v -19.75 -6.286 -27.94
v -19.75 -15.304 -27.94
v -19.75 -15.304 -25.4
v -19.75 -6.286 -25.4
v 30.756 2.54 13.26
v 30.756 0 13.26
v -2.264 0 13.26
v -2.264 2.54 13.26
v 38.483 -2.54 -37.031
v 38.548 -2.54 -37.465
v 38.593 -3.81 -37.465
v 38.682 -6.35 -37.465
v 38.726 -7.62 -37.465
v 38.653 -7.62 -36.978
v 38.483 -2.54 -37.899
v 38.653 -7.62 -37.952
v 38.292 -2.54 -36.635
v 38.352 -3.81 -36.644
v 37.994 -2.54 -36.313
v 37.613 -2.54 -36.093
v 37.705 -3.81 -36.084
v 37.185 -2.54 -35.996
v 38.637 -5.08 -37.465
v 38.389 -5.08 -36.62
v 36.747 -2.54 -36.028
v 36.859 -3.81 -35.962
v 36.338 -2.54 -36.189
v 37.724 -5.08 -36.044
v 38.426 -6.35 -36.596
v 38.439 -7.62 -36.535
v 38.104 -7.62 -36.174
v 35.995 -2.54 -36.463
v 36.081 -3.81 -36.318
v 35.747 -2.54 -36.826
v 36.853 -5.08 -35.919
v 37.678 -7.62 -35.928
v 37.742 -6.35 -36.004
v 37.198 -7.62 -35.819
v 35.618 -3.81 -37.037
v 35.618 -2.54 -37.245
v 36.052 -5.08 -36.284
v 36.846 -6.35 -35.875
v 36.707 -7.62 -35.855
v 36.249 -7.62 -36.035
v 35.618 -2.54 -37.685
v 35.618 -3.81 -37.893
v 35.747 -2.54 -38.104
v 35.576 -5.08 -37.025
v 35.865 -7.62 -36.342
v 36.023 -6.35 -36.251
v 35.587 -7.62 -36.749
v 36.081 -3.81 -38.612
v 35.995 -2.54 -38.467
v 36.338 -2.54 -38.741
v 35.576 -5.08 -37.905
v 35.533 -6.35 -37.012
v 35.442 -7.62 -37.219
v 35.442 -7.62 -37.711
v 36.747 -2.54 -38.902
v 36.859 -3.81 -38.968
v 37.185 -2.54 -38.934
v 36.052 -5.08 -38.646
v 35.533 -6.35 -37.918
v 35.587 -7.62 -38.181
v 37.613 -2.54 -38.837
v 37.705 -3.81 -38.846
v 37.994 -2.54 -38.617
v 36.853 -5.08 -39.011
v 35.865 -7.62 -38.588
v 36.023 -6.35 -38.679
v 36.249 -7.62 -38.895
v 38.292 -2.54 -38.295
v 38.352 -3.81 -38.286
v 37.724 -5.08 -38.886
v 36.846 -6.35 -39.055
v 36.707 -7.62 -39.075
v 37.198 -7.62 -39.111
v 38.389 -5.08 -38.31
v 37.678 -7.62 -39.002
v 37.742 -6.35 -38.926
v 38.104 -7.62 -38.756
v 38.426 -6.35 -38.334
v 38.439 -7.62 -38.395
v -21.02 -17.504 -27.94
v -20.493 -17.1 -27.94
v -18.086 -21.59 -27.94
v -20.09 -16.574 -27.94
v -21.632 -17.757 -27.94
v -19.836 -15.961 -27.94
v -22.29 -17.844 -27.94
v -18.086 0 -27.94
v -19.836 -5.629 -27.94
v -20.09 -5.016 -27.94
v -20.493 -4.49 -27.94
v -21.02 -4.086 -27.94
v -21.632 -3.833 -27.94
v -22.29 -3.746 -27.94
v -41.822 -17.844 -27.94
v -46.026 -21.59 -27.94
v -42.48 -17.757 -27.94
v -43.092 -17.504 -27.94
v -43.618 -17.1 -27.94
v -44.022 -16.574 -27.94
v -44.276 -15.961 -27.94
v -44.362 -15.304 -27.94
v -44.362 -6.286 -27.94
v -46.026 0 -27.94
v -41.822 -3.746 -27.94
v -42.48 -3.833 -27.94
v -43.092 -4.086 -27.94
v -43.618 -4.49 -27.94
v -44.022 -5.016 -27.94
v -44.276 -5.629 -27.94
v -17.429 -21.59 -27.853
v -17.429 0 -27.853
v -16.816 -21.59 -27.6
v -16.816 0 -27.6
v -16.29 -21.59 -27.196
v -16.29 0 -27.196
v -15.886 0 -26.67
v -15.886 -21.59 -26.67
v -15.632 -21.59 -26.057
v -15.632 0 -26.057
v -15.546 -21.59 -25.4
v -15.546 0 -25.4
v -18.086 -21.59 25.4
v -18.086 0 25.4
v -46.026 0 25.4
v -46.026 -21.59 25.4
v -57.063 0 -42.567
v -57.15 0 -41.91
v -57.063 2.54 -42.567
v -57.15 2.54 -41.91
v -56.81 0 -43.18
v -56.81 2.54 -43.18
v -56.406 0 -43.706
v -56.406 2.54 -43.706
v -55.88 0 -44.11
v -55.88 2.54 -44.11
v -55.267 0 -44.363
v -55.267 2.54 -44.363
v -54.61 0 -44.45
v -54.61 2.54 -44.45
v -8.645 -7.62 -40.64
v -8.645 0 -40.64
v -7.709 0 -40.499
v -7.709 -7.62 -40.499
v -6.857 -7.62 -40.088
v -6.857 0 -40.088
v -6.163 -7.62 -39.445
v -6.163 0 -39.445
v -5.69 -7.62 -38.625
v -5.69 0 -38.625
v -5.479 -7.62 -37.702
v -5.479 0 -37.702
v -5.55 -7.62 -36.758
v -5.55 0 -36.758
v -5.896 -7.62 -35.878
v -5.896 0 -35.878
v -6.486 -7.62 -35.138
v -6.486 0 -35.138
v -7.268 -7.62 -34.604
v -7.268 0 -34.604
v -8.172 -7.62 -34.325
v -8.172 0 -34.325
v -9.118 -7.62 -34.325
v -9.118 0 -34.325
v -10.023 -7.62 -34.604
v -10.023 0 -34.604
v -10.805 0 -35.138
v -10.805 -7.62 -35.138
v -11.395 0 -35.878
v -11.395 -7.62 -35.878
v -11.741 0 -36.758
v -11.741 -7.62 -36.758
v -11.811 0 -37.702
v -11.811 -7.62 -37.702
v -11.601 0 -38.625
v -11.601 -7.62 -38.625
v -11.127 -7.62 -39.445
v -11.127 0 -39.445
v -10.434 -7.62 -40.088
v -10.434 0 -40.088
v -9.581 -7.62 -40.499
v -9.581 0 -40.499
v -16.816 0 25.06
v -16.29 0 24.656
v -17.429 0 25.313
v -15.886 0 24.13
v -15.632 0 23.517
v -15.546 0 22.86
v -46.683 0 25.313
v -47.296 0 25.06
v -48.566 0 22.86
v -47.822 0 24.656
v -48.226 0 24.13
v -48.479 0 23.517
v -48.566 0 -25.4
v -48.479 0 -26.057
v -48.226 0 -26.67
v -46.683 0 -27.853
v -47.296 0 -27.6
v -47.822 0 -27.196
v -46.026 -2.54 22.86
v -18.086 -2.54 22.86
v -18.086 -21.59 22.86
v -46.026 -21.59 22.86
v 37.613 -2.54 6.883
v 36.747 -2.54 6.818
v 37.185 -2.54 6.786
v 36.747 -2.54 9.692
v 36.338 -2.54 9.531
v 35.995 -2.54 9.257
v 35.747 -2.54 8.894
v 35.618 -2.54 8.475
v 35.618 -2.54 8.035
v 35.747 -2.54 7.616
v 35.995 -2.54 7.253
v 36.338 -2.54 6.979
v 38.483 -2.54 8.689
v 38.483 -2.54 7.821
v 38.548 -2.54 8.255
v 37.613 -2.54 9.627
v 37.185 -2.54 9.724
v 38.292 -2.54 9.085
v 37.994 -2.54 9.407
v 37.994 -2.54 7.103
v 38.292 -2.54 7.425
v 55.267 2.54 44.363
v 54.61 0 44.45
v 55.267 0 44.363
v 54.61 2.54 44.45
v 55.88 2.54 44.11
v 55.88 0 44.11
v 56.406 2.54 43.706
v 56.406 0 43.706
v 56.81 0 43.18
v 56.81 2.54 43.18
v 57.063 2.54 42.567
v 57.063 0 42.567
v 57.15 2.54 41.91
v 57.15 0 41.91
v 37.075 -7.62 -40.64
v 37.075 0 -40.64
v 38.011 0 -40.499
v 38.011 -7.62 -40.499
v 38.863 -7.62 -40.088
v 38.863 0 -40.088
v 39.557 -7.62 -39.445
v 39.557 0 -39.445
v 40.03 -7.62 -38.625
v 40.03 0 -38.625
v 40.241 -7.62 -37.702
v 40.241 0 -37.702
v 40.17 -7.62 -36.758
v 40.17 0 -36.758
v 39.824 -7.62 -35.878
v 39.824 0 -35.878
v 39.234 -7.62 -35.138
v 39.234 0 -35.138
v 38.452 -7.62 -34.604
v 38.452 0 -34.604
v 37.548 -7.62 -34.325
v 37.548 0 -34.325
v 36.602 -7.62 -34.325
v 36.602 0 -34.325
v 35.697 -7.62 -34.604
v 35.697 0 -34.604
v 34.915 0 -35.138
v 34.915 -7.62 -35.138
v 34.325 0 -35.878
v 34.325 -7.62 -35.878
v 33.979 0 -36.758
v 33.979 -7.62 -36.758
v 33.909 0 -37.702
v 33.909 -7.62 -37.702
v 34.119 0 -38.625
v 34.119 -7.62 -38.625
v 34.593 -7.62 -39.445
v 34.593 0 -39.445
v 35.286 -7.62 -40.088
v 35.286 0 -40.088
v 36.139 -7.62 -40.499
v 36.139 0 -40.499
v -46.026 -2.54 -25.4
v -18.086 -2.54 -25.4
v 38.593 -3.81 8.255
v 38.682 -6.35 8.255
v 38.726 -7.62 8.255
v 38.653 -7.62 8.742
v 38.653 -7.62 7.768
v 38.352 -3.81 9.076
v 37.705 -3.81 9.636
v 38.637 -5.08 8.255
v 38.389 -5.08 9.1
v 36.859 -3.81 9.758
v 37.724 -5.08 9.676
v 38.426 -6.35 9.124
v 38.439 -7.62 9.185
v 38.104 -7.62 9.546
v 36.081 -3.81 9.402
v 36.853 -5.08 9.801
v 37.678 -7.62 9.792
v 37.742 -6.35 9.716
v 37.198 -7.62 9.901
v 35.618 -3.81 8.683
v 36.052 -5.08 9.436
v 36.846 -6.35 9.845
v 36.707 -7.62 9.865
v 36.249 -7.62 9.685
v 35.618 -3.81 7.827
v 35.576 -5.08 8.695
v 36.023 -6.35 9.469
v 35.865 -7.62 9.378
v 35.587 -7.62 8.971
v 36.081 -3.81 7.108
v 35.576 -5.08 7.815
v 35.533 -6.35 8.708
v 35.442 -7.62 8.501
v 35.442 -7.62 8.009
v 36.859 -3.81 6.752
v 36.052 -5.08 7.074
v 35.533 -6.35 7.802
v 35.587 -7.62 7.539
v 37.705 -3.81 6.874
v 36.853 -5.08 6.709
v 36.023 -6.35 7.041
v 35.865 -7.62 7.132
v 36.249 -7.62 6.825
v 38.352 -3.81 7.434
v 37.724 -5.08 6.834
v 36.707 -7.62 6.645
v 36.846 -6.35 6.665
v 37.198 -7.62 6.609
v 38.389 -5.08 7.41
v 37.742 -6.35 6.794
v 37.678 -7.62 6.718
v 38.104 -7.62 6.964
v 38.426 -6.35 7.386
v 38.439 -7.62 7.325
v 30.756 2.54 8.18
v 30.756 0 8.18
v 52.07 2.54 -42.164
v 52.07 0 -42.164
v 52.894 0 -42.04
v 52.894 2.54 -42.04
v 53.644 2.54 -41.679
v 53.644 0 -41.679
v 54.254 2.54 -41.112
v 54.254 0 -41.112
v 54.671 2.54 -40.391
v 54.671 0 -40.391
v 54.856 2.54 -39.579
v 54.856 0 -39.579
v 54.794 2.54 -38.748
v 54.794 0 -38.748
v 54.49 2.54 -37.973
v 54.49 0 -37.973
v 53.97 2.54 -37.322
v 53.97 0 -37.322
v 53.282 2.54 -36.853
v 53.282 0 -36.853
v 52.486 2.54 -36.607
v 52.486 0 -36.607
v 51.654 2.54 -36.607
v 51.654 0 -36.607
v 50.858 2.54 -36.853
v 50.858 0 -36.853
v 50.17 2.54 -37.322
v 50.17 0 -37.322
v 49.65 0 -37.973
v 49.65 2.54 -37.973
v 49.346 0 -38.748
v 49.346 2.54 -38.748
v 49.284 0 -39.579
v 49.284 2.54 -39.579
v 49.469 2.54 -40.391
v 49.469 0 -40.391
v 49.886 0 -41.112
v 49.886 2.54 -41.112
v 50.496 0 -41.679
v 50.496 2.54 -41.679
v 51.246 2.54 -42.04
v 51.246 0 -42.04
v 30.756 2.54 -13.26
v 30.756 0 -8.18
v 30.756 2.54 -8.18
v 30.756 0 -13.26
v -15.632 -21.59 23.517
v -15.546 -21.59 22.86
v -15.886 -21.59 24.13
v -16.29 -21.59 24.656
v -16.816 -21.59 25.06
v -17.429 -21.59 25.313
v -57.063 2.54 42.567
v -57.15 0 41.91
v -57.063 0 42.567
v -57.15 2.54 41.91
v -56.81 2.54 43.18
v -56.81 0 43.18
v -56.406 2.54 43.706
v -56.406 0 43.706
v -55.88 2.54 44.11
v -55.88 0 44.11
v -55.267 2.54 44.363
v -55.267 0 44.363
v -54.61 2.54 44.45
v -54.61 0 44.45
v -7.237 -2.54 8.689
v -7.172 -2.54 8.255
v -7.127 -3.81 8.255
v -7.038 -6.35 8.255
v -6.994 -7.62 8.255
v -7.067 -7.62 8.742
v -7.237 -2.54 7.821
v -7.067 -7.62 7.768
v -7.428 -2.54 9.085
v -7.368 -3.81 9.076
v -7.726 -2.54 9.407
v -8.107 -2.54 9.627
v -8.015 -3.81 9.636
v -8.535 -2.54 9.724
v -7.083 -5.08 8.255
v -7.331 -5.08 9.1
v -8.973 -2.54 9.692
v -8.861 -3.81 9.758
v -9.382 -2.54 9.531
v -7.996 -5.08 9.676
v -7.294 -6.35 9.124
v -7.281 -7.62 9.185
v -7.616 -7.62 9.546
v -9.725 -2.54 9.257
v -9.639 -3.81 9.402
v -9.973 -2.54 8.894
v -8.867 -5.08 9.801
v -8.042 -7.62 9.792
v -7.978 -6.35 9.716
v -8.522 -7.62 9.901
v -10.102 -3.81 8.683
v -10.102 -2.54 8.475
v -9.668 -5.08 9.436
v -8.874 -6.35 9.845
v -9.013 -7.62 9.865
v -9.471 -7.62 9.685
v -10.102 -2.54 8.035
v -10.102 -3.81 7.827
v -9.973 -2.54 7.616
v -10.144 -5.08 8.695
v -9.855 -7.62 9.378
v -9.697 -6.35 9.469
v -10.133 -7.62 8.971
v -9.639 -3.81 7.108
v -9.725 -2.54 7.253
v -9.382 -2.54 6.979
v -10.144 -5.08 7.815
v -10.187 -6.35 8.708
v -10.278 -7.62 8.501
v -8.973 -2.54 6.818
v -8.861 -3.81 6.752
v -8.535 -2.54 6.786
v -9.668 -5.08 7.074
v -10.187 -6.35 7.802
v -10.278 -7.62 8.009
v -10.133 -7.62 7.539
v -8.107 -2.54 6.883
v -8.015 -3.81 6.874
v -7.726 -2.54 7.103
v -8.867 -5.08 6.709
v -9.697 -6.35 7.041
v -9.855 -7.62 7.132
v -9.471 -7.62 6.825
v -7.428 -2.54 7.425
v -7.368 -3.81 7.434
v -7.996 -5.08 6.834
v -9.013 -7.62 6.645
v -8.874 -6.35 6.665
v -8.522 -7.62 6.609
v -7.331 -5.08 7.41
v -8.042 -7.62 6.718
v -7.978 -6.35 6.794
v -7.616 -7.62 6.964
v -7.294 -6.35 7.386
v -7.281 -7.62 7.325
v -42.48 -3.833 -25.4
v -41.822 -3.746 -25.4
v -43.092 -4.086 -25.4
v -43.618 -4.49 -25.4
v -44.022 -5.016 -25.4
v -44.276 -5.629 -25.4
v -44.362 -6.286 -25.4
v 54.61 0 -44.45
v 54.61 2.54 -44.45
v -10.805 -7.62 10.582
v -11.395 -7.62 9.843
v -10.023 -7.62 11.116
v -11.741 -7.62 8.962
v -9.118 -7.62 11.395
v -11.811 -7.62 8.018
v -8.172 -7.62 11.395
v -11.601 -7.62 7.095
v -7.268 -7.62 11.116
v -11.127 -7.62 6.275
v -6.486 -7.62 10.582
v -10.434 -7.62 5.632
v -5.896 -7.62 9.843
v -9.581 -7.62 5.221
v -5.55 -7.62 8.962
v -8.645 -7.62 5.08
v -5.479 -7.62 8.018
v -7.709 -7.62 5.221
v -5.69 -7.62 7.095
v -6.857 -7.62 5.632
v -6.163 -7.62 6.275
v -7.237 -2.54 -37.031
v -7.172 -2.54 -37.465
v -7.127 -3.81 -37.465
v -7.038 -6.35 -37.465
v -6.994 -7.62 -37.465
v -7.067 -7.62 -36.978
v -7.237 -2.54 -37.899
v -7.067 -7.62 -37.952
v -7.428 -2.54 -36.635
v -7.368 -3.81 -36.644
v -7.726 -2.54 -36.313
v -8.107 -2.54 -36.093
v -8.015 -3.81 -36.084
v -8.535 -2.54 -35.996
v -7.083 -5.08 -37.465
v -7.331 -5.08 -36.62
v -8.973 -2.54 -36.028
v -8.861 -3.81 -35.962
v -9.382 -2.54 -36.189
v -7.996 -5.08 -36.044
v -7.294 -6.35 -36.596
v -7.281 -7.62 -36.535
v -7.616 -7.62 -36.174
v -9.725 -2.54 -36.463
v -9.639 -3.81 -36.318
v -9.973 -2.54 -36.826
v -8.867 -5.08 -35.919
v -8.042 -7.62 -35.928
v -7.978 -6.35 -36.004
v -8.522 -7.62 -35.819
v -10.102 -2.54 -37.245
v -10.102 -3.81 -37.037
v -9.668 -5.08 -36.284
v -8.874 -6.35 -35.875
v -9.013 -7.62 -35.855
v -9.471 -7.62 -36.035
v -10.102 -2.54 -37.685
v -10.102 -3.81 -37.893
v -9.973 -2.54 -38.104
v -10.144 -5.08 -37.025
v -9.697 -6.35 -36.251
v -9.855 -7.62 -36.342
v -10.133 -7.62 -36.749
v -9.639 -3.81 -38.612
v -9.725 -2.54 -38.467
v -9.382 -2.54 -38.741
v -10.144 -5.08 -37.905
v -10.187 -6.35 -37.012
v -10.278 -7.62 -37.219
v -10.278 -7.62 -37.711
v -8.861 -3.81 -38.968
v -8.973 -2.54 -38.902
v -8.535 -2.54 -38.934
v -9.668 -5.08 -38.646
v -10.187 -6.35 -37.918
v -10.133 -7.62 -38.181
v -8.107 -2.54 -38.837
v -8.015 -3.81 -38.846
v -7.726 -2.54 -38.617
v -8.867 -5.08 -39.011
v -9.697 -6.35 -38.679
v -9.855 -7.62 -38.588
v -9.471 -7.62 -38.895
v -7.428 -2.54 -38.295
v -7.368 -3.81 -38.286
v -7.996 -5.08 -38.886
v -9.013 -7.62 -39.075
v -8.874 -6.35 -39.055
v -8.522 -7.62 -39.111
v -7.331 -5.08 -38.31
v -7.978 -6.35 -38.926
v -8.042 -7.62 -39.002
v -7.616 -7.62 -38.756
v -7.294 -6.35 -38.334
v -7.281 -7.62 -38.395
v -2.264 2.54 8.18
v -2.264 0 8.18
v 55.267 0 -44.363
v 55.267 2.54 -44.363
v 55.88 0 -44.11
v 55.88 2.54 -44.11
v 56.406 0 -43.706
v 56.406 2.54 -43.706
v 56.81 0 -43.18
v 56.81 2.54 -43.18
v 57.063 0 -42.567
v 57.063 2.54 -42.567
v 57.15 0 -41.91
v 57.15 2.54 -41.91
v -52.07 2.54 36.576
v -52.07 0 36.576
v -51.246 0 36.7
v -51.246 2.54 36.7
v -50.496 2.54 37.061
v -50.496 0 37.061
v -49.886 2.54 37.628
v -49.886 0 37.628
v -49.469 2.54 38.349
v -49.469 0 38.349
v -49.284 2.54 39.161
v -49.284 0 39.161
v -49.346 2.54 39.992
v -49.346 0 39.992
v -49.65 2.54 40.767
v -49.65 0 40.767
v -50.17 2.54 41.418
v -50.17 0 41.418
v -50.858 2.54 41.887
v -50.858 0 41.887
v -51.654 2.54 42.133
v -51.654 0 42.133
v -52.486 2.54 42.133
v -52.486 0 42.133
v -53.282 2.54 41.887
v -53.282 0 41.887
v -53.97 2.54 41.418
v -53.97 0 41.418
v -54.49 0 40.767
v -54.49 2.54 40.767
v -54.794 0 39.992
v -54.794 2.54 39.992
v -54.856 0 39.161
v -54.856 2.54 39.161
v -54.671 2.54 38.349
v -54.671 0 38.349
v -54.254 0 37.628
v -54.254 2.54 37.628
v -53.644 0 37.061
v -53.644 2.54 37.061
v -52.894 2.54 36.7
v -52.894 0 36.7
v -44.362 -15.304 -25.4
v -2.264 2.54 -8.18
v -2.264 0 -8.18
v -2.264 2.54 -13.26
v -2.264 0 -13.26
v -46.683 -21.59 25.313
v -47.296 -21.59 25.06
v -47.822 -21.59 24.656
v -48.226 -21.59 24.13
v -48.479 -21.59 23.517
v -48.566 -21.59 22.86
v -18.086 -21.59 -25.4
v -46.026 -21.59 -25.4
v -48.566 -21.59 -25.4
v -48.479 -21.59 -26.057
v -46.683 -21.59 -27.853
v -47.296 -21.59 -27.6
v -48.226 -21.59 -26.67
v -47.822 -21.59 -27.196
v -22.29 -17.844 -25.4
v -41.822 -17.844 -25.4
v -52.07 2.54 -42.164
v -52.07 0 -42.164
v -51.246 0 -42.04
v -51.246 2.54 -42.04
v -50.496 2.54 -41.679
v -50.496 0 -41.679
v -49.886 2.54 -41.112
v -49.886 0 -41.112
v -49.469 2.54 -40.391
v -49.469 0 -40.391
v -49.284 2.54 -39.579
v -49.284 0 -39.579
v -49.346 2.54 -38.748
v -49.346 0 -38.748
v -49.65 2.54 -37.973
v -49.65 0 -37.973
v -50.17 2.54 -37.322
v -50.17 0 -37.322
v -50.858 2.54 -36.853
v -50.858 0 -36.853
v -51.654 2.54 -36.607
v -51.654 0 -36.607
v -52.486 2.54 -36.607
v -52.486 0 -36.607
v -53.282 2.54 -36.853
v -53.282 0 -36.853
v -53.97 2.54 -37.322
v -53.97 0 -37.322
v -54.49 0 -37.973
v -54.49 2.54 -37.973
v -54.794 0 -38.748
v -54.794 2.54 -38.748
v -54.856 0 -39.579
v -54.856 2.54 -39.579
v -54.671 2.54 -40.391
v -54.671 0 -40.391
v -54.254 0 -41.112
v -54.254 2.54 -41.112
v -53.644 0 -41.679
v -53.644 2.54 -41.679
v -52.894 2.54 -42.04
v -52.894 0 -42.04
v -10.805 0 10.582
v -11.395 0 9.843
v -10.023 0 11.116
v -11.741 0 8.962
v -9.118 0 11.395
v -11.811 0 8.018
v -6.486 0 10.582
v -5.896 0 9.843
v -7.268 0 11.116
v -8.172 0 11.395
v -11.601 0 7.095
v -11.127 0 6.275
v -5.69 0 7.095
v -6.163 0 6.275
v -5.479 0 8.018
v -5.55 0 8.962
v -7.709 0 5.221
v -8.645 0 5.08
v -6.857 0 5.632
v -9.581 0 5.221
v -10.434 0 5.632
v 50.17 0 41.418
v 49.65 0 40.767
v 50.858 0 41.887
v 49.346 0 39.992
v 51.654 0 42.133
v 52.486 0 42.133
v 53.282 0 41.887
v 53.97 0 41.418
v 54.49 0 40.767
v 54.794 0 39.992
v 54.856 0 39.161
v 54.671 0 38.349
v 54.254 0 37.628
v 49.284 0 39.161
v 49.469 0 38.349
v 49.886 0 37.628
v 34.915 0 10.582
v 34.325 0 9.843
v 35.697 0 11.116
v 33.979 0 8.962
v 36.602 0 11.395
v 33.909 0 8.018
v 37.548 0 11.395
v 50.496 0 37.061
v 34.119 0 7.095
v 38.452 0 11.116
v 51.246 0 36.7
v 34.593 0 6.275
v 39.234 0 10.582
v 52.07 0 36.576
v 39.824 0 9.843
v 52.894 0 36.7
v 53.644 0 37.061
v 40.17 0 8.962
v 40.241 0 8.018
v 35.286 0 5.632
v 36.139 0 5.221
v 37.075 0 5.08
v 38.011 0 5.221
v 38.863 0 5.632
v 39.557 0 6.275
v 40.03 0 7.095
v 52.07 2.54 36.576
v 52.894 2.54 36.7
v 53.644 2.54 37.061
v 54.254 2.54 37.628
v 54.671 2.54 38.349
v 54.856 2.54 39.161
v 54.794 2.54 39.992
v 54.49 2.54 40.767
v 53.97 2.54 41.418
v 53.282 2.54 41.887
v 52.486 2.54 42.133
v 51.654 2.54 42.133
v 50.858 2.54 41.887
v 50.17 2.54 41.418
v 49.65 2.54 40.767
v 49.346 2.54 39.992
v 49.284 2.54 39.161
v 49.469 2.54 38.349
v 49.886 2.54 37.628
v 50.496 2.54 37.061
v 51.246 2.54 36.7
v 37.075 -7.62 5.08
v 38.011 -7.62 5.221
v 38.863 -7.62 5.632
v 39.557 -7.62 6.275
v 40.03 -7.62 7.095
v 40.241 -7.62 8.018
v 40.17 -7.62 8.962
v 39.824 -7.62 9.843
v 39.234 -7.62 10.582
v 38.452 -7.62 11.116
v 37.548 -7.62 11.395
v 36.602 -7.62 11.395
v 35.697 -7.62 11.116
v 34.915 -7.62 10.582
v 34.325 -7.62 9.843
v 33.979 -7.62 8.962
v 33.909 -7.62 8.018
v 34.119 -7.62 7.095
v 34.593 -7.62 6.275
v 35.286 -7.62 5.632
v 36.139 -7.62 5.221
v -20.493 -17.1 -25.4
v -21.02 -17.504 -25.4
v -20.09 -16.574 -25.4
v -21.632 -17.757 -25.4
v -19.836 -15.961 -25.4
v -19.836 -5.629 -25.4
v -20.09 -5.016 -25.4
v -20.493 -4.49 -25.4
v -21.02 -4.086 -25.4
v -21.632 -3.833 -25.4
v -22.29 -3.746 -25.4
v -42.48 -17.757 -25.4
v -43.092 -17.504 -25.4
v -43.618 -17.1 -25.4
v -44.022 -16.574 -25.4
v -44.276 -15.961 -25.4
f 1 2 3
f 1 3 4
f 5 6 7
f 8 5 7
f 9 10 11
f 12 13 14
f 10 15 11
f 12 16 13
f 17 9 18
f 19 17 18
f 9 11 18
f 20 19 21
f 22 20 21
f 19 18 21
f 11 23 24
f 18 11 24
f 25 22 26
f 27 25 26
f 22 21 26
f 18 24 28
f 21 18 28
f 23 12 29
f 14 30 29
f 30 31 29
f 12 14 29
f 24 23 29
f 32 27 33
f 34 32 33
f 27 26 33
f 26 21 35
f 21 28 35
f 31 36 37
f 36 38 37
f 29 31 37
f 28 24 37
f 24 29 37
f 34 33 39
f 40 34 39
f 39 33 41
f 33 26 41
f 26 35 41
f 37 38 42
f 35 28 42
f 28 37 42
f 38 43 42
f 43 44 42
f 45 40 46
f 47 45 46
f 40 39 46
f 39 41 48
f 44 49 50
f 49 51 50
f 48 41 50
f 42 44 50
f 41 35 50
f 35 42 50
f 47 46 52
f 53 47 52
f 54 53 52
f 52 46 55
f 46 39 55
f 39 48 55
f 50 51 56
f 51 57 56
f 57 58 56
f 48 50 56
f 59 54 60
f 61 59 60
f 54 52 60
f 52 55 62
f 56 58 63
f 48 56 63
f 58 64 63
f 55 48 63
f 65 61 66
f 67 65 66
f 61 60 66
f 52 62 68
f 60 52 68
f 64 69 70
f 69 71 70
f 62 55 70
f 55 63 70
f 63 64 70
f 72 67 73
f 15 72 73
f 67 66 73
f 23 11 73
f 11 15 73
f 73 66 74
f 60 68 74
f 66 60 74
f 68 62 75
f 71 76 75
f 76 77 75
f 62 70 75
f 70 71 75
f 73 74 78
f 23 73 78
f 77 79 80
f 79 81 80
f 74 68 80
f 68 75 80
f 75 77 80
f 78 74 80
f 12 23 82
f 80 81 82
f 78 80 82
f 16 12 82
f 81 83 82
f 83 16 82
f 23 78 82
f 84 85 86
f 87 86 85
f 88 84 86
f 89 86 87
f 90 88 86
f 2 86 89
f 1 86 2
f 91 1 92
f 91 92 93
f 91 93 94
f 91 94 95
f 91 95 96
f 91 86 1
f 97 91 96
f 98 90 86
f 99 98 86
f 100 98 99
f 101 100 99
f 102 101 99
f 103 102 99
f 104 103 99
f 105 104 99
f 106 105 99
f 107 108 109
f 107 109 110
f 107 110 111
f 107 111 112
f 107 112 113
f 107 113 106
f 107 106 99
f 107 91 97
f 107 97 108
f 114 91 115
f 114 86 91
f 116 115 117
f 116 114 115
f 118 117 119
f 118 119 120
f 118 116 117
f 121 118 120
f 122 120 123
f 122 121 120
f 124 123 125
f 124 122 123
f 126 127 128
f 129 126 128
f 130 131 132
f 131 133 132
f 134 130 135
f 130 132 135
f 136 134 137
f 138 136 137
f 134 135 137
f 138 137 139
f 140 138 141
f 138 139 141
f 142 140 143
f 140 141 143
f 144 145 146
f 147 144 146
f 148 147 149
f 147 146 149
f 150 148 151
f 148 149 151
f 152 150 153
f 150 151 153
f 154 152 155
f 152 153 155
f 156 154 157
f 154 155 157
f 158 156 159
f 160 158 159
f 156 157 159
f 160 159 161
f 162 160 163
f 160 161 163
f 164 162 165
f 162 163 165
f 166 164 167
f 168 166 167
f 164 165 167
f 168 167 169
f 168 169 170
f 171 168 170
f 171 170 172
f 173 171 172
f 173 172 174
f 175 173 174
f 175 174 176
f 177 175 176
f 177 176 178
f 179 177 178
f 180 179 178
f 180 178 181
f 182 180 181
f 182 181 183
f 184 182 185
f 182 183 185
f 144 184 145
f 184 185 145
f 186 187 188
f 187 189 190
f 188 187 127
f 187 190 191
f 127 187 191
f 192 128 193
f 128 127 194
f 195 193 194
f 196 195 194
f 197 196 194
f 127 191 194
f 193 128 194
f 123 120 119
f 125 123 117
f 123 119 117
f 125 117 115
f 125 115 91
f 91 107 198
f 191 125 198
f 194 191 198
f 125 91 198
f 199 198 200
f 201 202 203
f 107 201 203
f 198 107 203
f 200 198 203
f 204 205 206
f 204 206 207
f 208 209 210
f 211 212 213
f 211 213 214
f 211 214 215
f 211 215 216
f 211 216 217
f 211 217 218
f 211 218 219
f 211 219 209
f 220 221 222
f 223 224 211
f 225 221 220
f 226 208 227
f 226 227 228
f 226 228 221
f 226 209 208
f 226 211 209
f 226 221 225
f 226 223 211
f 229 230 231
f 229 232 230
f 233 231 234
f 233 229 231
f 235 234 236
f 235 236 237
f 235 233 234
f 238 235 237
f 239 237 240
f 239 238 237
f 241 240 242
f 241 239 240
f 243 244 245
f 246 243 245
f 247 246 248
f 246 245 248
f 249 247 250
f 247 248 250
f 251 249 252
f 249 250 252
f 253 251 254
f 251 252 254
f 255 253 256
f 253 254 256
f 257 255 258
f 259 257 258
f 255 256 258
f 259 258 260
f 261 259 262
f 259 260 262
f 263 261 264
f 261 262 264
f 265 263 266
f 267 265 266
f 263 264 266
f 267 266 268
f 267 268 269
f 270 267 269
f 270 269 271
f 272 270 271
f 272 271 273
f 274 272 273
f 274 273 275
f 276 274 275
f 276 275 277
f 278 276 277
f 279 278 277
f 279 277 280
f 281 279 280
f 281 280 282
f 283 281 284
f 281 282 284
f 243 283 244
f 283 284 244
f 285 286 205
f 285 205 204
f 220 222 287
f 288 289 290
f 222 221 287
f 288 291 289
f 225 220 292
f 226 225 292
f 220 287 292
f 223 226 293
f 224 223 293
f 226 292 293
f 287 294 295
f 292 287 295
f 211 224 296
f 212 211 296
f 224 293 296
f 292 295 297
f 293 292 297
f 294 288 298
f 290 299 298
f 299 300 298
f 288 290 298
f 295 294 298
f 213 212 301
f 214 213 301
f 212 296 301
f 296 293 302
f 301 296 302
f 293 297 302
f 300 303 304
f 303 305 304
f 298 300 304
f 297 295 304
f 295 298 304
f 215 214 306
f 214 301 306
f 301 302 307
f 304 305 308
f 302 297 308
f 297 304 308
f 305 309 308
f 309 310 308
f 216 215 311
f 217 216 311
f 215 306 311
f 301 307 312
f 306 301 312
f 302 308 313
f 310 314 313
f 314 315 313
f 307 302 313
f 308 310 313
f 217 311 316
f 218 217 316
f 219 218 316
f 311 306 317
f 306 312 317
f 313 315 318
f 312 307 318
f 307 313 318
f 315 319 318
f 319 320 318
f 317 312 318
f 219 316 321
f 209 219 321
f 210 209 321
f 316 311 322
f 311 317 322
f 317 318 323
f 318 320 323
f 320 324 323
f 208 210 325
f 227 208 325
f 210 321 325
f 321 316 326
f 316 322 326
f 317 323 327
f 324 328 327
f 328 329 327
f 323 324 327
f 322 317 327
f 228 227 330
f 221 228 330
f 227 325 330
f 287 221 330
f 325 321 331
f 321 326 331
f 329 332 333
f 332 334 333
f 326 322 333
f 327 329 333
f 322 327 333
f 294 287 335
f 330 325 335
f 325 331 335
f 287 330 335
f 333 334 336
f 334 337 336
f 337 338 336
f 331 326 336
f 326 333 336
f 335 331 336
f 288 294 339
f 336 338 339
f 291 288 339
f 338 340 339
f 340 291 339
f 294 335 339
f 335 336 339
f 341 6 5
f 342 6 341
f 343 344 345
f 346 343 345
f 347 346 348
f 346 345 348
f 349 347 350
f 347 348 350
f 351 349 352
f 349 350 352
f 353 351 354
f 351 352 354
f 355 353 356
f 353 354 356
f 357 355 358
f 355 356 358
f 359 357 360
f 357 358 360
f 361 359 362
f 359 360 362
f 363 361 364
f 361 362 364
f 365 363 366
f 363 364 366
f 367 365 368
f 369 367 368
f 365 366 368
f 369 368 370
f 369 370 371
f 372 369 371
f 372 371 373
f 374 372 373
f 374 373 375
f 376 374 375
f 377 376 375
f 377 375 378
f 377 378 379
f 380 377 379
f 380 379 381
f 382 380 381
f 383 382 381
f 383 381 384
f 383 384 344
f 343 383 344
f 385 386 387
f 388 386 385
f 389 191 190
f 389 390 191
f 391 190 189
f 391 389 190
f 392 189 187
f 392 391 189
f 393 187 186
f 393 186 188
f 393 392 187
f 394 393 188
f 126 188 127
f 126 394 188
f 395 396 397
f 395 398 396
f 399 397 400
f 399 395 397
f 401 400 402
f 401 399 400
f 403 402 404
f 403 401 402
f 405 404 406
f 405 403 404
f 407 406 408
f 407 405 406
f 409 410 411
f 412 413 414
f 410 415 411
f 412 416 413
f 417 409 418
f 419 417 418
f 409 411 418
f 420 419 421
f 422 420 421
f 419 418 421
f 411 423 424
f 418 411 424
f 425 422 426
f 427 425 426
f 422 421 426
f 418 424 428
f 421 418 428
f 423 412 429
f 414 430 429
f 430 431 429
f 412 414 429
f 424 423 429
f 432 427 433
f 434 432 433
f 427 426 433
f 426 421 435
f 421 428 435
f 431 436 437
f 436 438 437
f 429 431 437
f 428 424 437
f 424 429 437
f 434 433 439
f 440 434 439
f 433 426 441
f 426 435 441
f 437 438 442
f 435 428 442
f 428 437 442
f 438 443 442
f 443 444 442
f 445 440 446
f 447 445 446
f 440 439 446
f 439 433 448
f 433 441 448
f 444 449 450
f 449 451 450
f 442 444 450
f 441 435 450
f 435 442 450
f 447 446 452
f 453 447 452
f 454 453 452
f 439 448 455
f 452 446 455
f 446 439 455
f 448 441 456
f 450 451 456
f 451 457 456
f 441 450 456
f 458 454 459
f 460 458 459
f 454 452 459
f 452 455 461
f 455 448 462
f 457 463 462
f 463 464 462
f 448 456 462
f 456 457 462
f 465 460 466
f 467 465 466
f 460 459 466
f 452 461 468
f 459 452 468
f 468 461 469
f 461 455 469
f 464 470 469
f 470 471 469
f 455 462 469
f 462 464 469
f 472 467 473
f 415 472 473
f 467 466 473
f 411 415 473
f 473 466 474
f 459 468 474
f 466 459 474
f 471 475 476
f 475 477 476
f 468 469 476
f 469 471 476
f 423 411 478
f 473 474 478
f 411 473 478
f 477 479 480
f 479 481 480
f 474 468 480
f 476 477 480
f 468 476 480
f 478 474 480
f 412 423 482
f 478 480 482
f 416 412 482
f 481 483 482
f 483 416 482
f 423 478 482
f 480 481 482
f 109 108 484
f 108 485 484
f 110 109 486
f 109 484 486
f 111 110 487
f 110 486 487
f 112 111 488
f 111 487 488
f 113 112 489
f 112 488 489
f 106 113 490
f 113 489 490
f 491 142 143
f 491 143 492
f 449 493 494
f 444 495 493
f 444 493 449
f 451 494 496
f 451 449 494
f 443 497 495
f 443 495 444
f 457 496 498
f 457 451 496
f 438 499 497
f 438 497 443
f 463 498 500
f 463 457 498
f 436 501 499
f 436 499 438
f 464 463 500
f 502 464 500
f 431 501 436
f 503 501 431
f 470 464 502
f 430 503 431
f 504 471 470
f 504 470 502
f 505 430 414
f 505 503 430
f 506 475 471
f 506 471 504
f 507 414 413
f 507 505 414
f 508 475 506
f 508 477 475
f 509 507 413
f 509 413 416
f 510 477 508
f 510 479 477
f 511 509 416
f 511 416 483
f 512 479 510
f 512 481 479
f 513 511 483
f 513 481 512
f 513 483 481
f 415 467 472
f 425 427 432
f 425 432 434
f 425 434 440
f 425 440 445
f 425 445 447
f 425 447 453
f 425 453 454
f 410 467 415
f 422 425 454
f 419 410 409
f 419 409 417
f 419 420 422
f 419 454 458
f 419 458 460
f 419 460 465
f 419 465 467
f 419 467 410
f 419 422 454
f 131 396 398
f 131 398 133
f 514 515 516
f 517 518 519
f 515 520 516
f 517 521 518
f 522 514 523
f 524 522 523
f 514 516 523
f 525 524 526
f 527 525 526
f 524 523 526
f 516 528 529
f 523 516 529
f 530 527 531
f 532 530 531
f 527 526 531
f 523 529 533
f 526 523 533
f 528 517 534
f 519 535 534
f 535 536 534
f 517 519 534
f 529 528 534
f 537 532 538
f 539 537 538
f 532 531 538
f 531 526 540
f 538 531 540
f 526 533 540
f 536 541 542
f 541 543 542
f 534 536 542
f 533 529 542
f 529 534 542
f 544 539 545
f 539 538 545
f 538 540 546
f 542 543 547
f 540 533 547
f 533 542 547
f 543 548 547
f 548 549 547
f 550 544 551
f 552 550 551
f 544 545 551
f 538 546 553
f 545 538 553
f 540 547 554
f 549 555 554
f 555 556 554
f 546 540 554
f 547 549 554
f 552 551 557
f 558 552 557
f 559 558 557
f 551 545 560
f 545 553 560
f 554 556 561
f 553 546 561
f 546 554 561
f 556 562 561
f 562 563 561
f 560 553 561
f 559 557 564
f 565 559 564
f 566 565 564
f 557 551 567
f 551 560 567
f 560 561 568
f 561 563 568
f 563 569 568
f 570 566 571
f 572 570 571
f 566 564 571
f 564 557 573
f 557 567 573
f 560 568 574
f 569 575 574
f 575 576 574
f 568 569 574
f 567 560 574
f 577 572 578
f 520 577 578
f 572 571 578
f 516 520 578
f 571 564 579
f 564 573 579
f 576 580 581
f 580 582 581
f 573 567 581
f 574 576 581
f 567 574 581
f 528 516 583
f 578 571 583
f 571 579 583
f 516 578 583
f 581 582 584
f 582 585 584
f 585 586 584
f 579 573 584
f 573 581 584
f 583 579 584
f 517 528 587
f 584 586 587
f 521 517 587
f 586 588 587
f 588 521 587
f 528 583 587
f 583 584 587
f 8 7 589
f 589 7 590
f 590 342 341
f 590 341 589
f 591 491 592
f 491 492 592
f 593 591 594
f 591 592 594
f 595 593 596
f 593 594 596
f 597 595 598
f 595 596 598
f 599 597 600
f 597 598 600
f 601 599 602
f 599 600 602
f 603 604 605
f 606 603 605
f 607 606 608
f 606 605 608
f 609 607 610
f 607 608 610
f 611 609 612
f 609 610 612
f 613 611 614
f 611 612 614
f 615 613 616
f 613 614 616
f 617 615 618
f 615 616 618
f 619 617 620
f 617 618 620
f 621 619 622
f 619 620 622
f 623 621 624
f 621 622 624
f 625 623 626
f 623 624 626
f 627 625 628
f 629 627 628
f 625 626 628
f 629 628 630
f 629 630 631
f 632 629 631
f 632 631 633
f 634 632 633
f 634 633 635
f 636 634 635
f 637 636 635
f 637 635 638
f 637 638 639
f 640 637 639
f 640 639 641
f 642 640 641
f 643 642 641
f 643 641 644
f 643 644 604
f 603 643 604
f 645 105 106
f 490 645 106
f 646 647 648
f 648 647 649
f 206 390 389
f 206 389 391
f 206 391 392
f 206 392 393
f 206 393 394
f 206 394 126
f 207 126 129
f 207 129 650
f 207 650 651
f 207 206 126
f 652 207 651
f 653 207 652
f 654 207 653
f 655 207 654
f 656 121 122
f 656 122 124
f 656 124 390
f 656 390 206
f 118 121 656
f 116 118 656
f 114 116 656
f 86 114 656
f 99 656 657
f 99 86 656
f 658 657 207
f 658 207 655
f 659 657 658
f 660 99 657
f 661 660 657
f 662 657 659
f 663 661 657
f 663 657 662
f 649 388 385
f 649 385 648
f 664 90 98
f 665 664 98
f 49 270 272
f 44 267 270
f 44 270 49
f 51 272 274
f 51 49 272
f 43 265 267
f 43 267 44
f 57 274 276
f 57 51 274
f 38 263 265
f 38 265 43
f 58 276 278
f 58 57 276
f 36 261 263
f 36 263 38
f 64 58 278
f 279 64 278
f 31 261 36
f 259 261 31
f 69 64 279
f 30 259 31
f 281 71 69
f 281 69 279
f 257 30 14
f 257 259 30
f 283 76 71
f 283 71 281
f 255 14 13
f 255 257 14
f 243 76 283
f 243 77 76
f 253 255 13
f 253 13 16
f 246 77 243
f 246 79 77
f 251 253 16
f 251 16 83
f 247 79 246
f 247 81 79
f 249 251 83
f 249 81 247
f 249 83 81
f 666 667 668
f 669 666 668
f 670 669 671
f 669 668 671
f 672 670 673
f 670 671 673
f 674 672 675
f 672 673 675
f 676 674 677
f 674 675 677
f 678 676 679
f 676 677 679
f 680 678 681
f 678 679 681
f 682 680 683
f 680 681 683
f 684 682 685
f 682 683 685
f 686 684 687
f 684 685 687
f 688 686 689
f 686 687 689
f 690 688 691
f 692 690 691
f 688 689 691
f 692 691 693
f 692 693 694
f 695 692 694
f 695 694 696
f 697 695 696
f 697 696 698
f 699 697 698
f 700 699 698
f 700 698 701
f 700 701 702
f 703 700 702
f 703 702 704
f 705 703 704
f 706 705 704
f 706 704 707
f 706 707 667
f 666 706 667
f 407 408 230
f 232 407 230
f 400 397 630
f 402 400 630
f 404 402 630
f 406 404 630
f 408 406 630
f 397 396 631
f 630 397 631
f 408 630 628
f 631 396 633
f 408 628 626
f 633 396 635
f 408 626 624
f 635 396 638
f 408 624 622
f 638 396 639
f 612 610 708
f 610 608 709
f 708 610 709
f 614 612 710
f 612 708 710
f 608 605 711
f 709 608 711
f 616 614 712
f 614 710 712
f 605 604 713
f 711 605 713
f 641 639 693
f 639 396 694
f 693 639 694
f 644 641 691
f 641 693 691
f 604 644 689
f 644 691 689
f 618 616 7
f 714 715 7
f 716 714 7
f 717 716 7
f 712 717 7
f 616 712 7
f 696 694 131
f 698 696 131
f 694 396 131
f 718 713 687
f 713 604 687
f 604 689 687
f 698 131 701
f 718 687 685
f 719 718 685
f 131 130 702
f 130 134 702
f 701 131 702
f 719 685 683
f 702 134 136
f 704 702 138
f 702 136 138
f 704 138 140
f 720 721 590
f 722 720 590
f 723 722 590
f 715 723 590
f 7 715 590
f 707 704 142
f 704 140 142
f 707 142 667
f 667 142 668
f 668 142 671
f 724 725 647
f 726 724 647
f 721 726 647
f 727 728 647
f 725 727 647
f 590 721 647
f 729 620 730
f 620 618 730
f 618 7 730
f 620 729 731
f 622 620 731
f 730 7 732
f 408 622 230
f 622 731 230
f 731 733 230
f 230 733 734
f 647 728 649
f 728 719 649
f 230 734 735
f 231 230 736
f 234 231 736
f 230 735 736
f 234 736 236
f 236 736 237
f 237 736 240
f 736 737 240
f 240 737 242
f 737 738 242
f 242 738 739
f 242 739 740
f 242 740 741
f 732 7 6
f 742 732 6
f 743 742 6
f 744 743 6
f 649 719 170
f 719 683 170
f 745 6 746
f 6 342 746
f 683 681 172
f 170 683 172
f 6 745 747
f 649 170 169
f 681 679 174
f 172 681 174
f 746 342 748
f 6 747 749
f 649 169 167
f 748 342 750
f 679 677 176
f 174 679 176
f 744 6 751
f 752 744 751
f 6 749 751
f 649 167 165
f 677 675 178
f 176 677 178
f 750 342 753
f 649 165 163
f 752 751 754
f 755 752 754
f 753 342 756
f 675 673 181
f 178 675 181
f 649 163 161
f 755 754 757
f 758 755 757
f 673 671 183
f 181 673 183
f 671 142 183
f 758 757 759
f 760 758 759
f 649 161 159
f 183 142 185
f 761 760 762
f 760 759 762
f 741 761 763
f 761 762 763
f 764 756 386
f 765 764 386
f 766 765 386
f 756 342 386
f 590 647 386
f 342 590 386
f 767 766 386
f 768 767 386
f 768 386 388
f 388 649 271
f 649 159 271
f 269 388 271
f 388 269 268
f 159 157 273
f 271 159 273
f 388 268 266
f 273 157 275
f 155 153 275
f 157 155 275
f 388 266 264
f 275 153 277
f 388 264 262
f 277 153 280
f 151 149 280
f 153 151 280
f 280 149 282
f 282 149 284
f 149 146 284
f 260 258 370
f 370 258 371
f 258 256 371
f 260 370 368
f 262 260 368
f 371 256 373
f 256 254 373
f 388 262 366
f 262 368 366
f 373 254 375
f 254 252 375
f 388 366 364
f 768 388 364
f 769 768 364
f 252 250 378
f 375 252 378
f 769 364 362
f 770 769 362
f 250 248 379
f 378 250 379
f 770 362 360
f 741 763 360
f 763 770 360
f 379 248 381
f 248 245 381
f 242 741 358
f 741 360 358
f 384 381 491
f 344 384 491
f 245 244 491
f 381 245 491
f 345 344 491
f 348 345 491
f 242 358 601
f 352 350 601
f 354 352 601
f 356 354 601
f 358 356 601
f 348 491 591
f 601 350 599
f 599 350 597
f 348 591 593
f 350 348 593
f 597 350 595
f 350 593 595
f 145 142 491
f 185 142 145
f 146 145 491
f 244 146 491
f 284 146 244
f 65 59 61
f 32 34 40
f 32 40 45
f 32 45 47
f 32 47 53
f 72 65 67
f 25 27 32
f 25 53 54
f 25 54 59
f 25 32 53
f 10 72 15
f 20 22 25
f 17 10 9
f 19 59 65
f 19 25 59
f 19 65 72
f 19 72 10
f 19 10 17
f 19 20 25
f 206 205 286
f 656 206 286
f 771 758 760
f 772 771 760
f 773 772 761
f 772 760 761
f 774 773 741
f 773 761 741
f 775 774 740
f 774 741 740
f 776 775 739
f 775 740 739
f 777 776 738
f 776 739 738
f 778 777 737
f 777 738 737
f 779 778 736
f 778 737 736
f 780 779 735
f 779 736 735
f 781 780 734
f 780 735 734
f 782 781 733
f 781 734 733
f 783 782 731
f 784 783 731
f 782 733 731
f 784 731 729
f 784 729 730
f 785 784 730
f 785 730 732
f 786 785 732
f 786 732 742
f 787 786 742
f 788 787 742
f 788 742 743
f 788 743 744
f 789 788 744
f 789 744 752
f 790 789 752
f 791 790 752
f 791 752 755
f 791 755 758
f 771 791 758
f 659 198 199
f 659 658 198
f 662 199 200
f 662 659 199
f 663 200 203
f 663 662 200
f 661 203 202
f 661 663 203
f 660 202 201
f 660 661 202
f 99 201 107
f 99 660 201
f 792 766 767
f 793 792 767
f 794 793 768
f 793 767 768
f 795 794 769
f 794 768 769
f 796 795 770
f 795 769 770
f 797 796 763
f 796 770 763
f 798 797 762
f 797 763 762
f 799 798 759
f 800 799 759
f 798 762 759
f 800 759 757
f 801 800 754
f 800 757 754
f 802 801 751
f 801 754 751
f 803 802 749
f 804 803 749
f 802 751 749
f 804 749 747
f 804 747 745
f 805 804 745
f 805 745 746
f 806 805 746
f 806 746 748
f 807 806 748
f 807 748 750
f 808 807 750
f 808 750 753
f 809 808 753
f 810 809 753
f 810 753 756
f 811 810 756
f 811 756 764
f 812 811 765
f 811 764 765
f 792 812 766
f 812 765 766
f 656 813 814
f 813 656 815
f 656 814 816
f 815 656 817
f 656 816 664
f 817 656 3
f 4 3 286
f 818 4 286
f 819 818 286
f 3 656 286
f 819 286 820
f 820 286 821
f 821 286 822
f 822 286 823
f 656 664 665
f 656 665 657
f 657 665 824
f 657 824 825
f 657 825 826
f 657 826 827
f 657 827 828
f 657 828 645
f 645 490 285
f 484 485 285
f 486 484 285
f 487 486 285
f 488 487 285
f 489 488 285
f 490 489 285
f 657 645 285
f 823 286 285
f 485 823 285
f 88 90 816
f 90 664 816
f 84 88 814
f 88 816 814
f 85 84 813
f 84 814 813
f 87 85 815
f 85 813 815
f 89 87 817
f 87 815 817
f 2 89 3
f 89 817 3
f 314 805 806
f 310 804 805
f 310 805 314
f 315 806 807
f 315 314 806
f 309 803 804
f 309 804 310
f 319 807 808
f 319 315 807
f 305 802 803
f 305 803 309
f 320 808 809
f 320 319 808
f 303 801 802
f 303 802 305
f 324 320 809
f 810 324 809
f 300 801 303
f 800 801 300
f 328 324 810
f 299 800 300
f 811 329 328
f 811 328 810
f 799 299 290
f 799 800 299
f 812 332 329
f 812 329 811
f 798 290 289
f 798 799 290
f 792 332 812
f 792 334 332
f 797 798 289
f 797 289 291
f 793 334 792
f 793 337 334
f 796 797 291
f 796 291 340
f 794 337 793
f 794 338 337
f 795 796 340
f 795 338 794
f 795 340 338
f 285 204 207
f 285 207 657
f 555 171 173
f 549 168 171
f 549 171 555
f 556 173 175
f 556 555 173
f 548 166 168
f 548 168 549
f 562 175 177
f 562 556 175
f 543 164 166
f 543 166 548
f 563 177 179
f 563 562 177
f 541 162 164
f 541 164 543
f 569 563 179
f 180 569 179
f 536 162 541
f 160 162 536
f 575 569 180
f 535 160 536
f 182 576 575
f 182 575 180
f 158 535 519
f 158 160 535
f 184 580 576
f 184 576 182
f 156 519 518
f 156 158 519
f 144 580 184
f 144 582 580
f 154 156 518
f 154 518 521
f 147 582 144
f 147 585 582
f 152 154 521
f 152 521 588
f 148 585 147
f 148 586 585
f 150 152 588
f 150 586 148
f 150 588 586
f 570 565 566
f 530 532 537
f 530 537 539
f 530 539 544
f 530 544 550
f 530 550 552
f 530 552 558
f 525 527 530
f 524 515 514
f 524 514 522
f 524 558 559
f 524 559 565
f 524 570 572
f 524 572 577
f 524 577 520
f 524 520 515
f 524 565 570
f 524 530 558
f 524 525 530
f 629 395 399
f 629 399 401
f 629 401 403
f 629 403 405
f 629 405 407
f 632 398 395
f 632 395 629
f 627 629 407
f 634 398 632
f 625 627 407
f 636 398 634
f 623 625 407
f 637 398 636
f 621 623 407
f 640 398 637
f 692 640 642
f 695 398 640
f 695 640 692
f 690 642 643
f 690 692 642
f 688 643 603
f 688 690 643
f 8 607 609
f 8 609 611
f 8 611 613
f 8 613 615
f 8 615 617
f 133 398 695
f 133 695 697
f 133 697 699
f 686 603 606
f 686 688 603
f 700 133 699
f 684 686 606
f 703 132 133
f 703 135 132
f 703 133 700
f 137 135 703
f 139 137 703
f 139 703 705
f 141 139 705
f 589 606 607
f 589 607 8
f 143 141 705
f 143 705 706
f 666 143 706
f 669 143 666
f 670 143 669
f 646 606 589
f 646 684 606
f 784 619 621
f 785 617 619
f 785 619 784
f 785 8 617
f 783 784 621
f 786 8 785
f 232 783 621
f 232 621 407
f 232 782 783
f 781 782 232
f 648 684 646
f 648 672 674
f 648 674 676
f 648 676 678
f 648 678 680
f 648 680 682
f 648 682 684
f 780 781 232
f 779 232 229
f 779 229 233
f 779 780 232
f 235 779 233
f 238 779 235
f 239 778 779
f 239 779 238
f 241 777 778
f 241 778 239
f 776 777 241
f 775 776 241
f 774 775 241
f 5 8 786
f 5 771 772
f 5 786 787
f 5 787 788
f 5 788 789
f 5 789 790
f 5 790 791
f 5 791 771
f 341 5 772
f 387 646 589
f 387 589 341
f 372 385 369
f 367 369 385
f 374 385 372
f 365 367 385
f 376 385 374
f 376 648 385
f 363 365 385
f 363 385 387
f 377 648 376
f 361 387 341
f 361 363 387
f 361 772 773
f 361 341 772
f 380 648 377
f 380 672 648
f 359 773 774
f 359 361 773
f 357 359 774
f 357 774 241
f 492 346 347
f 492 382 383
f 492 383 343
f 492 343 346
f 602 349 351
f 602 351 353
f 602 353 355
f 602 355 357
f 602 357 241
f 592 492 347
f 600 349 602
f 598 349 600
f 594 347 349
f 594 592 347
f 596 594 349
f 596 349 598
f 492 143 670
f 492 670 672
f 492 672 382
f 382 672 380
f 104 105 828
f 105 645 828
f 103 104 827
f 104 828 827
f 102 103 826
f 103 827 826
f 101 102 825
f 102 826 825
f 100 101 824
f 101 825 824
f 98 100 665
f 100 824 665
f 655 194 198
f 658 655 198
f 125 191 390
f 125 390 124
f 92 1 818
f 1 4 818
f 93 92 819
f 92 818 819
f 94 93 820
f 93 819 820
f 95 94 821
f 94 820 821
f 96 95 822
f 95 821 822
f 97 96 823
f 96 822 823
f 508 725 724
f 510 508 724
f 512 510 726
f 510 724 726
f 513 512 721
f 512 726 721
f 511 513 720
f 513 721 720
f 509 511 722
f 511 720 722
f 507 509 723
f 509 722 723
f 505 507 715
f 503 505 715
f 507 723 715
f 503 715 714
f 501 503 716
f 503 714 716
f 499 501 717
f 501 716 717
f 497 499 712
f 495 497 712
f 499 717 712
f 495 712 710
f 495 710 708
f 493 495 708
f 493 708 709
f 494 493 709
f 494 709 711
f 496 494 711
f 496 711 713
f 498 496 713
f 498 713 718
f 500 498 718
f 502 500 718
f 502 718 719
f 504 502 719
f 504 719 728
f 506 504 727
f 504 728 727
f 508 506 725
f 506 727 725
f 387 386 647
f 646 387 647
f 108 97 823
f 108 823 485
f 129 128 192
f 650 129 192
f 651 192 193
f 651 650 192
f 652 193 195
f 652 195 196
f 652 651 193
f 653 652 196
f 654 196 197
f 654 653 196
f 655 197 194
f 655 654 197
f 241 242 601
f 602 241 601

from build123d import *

# Parameters (mm, degrees)
SKETCH1_W                    = 114.3
SKETCH1_H                    = 88.9
BOSS_EXTRUDE2_DEPTH          = 2.54
SKETCH2_R                    = 2.794
CUT_EXTRUDE1_DEPTH           = 5.08
SKETCH9_W                    = 33.02
SKETCH9_H                    = 5.08
CUT_EXTRUDE5_DEPTH           = 6.35
SKETCH8_W                    = 33.02
SKETCH8_H                    = 53.34
BOSS_EXTRUDE4_DEPTH          = 21.59
SHELL4_T                     = -2.54
SKETCH13_W                   = 24.612851837
SKETCH13_H                   = 14.097856124
CUT_EXTRUDE6_DEPTH           = 5.08
FILLET5_R                    = 2.54
FILLET6_R                    = 2.54
FILLET7_R                    = 2.54
FILLET8_R                    = 2.54
FILLET1_R                    = 2.54
FILLET2_R                    = 2.54
FILLET3_R                    = 2.54
FILLET4_R                    = 2.54
FILLET9_R                    = 2.54
FILLET10_R                   = 2.54
FILLET11_R                   = 2.54
FILLET12_R                   = 2.54
SKETCH17_R                   = 3.175
BOSS_EXTRUDE5_DEPTH          = 7.62
SKETCH18_R                   = 1.651
CUT_EXTRUDE7_DEPTH           = 5.08
CUT_EXTRUDE7_DRAFT           = -2
CUT_EXTRUDE7_PROFILE_2_DEPTH = 5.08
CUT_EXTRUDE7_PROFILE_2_DRAFT = -2
CUT_EXTRUDE7_PROFILE_3_DEPTH = 5.08
CUT_EXTRUDE7_PROFILE_3_DRAFT = -2
CUT_EXTRUDE7_PROFILE_4_DEPTH = 5.08
CUT_EXTRUDE7_PROFILE_4_DRAFT = -2


with BuildPart() as part:
    # Sketch1 → Boss-Extrude2 (new body)
    with BuildSketch(Plane(origin=(0, 0, 0), x_dir=(1, 0, 0), z_dir=(0, 1, 0))):
        Rectangle(SKETCH1_W, SKETCH1_H)
    extrude(amount=BOSS_EXTRUDE2_DEPTH)

    # Sketch2 → Cut-Extrude1 (cut)
    with BuildSketch(Plane(origin=(0, 0, 0), x_dir=(-1, 0, 0), z_dir=(0, -1, 0))):
        with Locations(Location((52.07, 39.37, 0), (0, 0, 90))):
            Circle(SKETCH2_R)
        with Locations(Location((52.07, -39.37, 0), (0, 0, 90))):
            Circle(SKETCH2_R)
        with Locations(Location((-52.07, -39.37, 0), (0, 0, 90))):
            Circle(SKETCH2_R)
        with Locations(Location((-52.07, 39.37, 0), (0, 0, 90))):
            Circle(SKETCH2_R)
    extrude(amount=-CUT_EXTRUDE1_DEPTH, mode=Mode.SUBTRACT)

    # Sketch9 → Cut-Extrude5 (cut)
    with BuildSketch(Plane(origin=(0, 0, 0), x_dir=(-1, 0, 0), z_dir=(0, -1, 0))):
        with Locations((-14.245526461, -10.719909337)):
            Rectangle(SKETCH9_W, SKETCH9_H)
        with Locations((-14.245526461, 10.719909337)):
            Rectangle(SKETCH9_W, SKETCH9_H)
    extrude(amount=-CUT_EXTRUDE5_DEPTH, mode=Mode.SUBTRACT)

    # Fillet1
    fillet1_edges = [part.edges().sort_by_distance(p)[0] for p in [
        (57.15, 1.27, 44.45),
    ]]
    fillet(fillet1_edges, radius=FILLET1_R)

    # Fillet2
    fillet2_edges = [part.edges().sort_by_distance(p)[0] for p in [
        (-57.15, 1.27, -44.45),
    ]]
    fillet(fillet2_edges, radius=FILLET2_R)

    # Fillet3
    fillet3_edges = [part.edges().sort_by_distance(p)[0] for p in [
        (-57.15, 1.27, 44.45),
    ]]
    fillet(fillet3_edges, radius=FILLET3_R)

    # Fillet4
    fillet4_edges = [part.edges().sort_by_distance(p)[0] for p in [
        (57.15, 1.27, -44.45),
    ]]
    fillet(fillet4_edges, radius=FILLET4_R)

    # Sketch17 → Boss-Extrude5 (add)
    with BuildSketch(Plane(origin=(0, 0, 0), x_dir=(-1, 0, 0), z_dir=(0, -1, 0))):
        with Locations(Location((8.645141255, -8.255, 0), (0, 0, 90))):
            Circle(SKETCH17_R)
        with Locations(Location((8.645141255, 37.465, 0), (0, 0, 90))):
            Circle(SKETCH17_R)
        with Locations(Location((-37.074858745, 37.465, 0), (0, 0, 90))):
            Circle(SKETCH17_R)
        with Locations(Location((-37.074858745, -8.255, 0), (0, 0, 90))):
            Circle(SKETCH17_R)
    extrude(amount=BOSS_EXTRUDE5_DEPTH)


with BuildPart() as body_2:
    # Sketch8 → Boss-Extrude4 (new body)
    with BuildSketch(Plane(origin=(0, 0, 0), x_dir=(-1, 0, 0), z_dir=(0, -1, 0))):
        with Locations((32.055940653, 1.27)):
            Rectangle(SKETCH8_W, SKETCH8_H)
    extrude(amount=BOSS_EXTRUDE4_DEPTH)

    # Shell4
    shell4_openings = [body_2.faces().sort_by_distance(p)[0] for p in [
        (-32.055940653, -21.59, -1.27),
    ]]
    offset(amount=SHELL4_T, openings=shell4_openings, kind=Kind.INTERSECTION)

    # Sketch13 → Cut-Extrude6 (cut)
    with BuildSketch(Plane(origin=(0, 0, -27.94), x_dir=(-1, 0, 0), z_dir=(0, 0, -1))):
        with Locations((32.055940652, -10.795)):
            Rectangle(SKETCH13_W, SKETCH13_H)
    extrude(amount=-CUT_EXTRUDE6_DEPTH, mode=Mode.SUBTRACT)

    # Fillet5
    fillet5_edges = [body_2.edges().sort_by_distance(p)[0] for p in [
        (-19.749514734, -17.843928062, -26.67),
    ]]
    fillet(fillet5_edges, radius=FILLET5_R)

    # Fillet6
    fillet6_edges = [body_2.edges().sort_by_distance(p)[0] for p in [
        (-19.749514734, -3.746071938, -26.67),
    ]]
    fillet(fillet6_edges, radius=FILLET6_R)

    # Fillet7
    fillet7_edges = [body_2.edges().sort_by_distance(p)[0] for p in [
        (-44.362366571, -3.746071938, -26.67),
    ]]
    fillet(fillet7_edges, radius=FILLET7_R)

    # Fillet8
    fillet8_edges = [body_2.edges().sort_by_distance(p)[0] for p in [
        (-44.362366571, -17.843928062, -26.67),
    ]]
    fillet(fillet8_edges, radius=FILLET8_R)

    # Fillet9
    fillet9_edges = [body_2.edges().sort_by_distance(p)[0] for p in [
        (-15.545940653, -10.795, -27.94),
    ]]
    fillet(fillet9_edges, radius=FILLET9_R)

    # Fillet10
    fillet10_edges = [body_2.edges().sort_by_distance(p)[0] for p in [
        (-15.545940653, -10.795, 25.4),
    ]]
    fillet(fillet10_edges, radius=FILLET10_R)

    # Fillet11
    fillet11_edges = [body_2.edges().sort_by_distance(p)[0] for p in [
        (-48.565940653, -10.795, 25.4),
    ]]
    fillet(fillet11_edges, radius=FILLET11_R)

    # Fillet12
    fillet12_edges = [body_2.edges().sort_by_distance(p)[0] for p in [
        (-48.565940653, -10.795, -27.94),
    ]]
    fillet(fillet12_edges, radius=FILLET12_R)


with BuildPart() as cut_extrude7_tool:
    # Sketch18 → Cut-Extrude7 (with draft: the straight prism first)
    with BuildSketch(Plane.XZ.offset(7.62)):
        with Locations((37.074858745, 8.255)):
            Circle(SKETCH18_R)
    extrude(amount=-CUT_EXTRUDE7_DEPTH)
    # Cut-Extrude7: the draft: its side faces are tilted about the plane it starts from
    cut_extrude7_sides = [cut_extrude7_tool.faces().sort_by_distance(p)[0] for p in [
        (35.423858745, -5.08, 8.255),
    ]]
    draft(cut_extrude7_sides, Plane.XZ.offset(7.62), CUT_EXTRUDE7_DRAFT)


with BuildPart() as part_1:
    add(part.part)

    # Cut-Extrude7: cut by cut_extrude7_tool
    add(cut_extrude7_tool.part, mode=Mode.SUBTRACT)


with BuildPart() as cut_extrude7_profile_2_tool:
    # Sketch18 → Cut-Extrude7 profile 2 (with draft: the straight prism first)
    with BuildSketch(Plane.XZ.offset(7.62)):
        with Locations((37.074858745, -37.465)):
            Circle(SKETCH18_R)
    extrude(amount=-CUT_EXTRUDE7_PROFILE_2_DEPTH)
    # Cut-Extrude7 profile 2: the draft: its side faces are tilted about the plane it starts from
    cut_extrude7_profile_2_sides = [cut_extrude7_profile_2_tool.faces().sort_by_distance(p)[0] for p in [
        (35.423858745, -5.08, -37.465),
    ]]
    draft(cut_extrude7_profile_2_sides, Plane.XZ.offset(7.62), CUT_EXTRUDE7_PROFILE_2_DRAFT)


with BuildPart() as part_2:
    add(part_1.part)

    # Cut-Extrude7 profile 2: cut by cut_extrude7_profile_2_tool
    add(cut_extrude7_profile_2_tool.part, mode=Mode.SUBTRACT)


with BuildPart() as cut_extrude7_profile_3_tool:
    # Sketch18 → Cut-Extrude7 profile 3 (with draft: the straight prism first)
    with BuildSketch(Plane.XZ.offset(7.62)):
        with Locations((-8.645141255, -37.465)):
            Circle(SKETCH18_R)
    extrude(amount=-CUT_EXTRUDE7_PROFILE_3_DEPTH)
    # Cut-Extrude7 profile 3: the draft: its side faces are tilted about the plane it starts from
    cut_extrude7_profile_3_sides = [cut_extrude7_profile_3_tool.faces().sort_by_distance(p)[0] for p in [
        (-10.296141255, -5.08, -37.465),
    ]]
    draft(cut_extrude7_profile_3_sides, Plane.XZ.offset(7.62), CUT_EXTRUDE7_PROFILE_3_DRAFT)


with BuildPart() as part_3:
    add(part_2.part)

    # Cut-Extrude7 profile 3: cut by cut_extrude7_profile_3_tool
    add(cut_extrude7_profile_3_tool.part, mode=Mode.SUBTRACT)


with BuildPart() as cut_extrude7_profile_4_tool:
    # Sketch18 → Cut-Extrude7 profile 4 (with draft: the straight prism first)
    with BuildSketch(Plane.XZ.offset(7.62)):
        with Locations((-8.645141255, 8.255)):
            Circle(SKETCH18_R)
    extrude(amount=-CUT_EXTRUDE7_PROFILE_4_DEPTH)
    # Cut-Extrude7 profile 4: the draft: its side faces are tilted about the plane it starts from
    cut_extrude7_profile_4_sides = [cut_extrude7_profile_4_tool.faces().sort_by_distance(p)[0] for p in [
        (-10.296141255, -5.08, 8.255),
    ]]
    draft(cut_extrude7_profile_4_sides, Plane.XZ.offset(7.62), CUT_EXTRUDE7_PROFILE_4_DRAFT)


with BuildPart() as part_4:
    add(part_3.part)

    # Cut-Extrude7 profile 4: cut by cut_extrude7_profile_4_tool
    add(cut_extrude7_profile_4_tool.part, mode=Mode.SUBTRACT)


solid = Compound([body_2.part, part_4.part])
